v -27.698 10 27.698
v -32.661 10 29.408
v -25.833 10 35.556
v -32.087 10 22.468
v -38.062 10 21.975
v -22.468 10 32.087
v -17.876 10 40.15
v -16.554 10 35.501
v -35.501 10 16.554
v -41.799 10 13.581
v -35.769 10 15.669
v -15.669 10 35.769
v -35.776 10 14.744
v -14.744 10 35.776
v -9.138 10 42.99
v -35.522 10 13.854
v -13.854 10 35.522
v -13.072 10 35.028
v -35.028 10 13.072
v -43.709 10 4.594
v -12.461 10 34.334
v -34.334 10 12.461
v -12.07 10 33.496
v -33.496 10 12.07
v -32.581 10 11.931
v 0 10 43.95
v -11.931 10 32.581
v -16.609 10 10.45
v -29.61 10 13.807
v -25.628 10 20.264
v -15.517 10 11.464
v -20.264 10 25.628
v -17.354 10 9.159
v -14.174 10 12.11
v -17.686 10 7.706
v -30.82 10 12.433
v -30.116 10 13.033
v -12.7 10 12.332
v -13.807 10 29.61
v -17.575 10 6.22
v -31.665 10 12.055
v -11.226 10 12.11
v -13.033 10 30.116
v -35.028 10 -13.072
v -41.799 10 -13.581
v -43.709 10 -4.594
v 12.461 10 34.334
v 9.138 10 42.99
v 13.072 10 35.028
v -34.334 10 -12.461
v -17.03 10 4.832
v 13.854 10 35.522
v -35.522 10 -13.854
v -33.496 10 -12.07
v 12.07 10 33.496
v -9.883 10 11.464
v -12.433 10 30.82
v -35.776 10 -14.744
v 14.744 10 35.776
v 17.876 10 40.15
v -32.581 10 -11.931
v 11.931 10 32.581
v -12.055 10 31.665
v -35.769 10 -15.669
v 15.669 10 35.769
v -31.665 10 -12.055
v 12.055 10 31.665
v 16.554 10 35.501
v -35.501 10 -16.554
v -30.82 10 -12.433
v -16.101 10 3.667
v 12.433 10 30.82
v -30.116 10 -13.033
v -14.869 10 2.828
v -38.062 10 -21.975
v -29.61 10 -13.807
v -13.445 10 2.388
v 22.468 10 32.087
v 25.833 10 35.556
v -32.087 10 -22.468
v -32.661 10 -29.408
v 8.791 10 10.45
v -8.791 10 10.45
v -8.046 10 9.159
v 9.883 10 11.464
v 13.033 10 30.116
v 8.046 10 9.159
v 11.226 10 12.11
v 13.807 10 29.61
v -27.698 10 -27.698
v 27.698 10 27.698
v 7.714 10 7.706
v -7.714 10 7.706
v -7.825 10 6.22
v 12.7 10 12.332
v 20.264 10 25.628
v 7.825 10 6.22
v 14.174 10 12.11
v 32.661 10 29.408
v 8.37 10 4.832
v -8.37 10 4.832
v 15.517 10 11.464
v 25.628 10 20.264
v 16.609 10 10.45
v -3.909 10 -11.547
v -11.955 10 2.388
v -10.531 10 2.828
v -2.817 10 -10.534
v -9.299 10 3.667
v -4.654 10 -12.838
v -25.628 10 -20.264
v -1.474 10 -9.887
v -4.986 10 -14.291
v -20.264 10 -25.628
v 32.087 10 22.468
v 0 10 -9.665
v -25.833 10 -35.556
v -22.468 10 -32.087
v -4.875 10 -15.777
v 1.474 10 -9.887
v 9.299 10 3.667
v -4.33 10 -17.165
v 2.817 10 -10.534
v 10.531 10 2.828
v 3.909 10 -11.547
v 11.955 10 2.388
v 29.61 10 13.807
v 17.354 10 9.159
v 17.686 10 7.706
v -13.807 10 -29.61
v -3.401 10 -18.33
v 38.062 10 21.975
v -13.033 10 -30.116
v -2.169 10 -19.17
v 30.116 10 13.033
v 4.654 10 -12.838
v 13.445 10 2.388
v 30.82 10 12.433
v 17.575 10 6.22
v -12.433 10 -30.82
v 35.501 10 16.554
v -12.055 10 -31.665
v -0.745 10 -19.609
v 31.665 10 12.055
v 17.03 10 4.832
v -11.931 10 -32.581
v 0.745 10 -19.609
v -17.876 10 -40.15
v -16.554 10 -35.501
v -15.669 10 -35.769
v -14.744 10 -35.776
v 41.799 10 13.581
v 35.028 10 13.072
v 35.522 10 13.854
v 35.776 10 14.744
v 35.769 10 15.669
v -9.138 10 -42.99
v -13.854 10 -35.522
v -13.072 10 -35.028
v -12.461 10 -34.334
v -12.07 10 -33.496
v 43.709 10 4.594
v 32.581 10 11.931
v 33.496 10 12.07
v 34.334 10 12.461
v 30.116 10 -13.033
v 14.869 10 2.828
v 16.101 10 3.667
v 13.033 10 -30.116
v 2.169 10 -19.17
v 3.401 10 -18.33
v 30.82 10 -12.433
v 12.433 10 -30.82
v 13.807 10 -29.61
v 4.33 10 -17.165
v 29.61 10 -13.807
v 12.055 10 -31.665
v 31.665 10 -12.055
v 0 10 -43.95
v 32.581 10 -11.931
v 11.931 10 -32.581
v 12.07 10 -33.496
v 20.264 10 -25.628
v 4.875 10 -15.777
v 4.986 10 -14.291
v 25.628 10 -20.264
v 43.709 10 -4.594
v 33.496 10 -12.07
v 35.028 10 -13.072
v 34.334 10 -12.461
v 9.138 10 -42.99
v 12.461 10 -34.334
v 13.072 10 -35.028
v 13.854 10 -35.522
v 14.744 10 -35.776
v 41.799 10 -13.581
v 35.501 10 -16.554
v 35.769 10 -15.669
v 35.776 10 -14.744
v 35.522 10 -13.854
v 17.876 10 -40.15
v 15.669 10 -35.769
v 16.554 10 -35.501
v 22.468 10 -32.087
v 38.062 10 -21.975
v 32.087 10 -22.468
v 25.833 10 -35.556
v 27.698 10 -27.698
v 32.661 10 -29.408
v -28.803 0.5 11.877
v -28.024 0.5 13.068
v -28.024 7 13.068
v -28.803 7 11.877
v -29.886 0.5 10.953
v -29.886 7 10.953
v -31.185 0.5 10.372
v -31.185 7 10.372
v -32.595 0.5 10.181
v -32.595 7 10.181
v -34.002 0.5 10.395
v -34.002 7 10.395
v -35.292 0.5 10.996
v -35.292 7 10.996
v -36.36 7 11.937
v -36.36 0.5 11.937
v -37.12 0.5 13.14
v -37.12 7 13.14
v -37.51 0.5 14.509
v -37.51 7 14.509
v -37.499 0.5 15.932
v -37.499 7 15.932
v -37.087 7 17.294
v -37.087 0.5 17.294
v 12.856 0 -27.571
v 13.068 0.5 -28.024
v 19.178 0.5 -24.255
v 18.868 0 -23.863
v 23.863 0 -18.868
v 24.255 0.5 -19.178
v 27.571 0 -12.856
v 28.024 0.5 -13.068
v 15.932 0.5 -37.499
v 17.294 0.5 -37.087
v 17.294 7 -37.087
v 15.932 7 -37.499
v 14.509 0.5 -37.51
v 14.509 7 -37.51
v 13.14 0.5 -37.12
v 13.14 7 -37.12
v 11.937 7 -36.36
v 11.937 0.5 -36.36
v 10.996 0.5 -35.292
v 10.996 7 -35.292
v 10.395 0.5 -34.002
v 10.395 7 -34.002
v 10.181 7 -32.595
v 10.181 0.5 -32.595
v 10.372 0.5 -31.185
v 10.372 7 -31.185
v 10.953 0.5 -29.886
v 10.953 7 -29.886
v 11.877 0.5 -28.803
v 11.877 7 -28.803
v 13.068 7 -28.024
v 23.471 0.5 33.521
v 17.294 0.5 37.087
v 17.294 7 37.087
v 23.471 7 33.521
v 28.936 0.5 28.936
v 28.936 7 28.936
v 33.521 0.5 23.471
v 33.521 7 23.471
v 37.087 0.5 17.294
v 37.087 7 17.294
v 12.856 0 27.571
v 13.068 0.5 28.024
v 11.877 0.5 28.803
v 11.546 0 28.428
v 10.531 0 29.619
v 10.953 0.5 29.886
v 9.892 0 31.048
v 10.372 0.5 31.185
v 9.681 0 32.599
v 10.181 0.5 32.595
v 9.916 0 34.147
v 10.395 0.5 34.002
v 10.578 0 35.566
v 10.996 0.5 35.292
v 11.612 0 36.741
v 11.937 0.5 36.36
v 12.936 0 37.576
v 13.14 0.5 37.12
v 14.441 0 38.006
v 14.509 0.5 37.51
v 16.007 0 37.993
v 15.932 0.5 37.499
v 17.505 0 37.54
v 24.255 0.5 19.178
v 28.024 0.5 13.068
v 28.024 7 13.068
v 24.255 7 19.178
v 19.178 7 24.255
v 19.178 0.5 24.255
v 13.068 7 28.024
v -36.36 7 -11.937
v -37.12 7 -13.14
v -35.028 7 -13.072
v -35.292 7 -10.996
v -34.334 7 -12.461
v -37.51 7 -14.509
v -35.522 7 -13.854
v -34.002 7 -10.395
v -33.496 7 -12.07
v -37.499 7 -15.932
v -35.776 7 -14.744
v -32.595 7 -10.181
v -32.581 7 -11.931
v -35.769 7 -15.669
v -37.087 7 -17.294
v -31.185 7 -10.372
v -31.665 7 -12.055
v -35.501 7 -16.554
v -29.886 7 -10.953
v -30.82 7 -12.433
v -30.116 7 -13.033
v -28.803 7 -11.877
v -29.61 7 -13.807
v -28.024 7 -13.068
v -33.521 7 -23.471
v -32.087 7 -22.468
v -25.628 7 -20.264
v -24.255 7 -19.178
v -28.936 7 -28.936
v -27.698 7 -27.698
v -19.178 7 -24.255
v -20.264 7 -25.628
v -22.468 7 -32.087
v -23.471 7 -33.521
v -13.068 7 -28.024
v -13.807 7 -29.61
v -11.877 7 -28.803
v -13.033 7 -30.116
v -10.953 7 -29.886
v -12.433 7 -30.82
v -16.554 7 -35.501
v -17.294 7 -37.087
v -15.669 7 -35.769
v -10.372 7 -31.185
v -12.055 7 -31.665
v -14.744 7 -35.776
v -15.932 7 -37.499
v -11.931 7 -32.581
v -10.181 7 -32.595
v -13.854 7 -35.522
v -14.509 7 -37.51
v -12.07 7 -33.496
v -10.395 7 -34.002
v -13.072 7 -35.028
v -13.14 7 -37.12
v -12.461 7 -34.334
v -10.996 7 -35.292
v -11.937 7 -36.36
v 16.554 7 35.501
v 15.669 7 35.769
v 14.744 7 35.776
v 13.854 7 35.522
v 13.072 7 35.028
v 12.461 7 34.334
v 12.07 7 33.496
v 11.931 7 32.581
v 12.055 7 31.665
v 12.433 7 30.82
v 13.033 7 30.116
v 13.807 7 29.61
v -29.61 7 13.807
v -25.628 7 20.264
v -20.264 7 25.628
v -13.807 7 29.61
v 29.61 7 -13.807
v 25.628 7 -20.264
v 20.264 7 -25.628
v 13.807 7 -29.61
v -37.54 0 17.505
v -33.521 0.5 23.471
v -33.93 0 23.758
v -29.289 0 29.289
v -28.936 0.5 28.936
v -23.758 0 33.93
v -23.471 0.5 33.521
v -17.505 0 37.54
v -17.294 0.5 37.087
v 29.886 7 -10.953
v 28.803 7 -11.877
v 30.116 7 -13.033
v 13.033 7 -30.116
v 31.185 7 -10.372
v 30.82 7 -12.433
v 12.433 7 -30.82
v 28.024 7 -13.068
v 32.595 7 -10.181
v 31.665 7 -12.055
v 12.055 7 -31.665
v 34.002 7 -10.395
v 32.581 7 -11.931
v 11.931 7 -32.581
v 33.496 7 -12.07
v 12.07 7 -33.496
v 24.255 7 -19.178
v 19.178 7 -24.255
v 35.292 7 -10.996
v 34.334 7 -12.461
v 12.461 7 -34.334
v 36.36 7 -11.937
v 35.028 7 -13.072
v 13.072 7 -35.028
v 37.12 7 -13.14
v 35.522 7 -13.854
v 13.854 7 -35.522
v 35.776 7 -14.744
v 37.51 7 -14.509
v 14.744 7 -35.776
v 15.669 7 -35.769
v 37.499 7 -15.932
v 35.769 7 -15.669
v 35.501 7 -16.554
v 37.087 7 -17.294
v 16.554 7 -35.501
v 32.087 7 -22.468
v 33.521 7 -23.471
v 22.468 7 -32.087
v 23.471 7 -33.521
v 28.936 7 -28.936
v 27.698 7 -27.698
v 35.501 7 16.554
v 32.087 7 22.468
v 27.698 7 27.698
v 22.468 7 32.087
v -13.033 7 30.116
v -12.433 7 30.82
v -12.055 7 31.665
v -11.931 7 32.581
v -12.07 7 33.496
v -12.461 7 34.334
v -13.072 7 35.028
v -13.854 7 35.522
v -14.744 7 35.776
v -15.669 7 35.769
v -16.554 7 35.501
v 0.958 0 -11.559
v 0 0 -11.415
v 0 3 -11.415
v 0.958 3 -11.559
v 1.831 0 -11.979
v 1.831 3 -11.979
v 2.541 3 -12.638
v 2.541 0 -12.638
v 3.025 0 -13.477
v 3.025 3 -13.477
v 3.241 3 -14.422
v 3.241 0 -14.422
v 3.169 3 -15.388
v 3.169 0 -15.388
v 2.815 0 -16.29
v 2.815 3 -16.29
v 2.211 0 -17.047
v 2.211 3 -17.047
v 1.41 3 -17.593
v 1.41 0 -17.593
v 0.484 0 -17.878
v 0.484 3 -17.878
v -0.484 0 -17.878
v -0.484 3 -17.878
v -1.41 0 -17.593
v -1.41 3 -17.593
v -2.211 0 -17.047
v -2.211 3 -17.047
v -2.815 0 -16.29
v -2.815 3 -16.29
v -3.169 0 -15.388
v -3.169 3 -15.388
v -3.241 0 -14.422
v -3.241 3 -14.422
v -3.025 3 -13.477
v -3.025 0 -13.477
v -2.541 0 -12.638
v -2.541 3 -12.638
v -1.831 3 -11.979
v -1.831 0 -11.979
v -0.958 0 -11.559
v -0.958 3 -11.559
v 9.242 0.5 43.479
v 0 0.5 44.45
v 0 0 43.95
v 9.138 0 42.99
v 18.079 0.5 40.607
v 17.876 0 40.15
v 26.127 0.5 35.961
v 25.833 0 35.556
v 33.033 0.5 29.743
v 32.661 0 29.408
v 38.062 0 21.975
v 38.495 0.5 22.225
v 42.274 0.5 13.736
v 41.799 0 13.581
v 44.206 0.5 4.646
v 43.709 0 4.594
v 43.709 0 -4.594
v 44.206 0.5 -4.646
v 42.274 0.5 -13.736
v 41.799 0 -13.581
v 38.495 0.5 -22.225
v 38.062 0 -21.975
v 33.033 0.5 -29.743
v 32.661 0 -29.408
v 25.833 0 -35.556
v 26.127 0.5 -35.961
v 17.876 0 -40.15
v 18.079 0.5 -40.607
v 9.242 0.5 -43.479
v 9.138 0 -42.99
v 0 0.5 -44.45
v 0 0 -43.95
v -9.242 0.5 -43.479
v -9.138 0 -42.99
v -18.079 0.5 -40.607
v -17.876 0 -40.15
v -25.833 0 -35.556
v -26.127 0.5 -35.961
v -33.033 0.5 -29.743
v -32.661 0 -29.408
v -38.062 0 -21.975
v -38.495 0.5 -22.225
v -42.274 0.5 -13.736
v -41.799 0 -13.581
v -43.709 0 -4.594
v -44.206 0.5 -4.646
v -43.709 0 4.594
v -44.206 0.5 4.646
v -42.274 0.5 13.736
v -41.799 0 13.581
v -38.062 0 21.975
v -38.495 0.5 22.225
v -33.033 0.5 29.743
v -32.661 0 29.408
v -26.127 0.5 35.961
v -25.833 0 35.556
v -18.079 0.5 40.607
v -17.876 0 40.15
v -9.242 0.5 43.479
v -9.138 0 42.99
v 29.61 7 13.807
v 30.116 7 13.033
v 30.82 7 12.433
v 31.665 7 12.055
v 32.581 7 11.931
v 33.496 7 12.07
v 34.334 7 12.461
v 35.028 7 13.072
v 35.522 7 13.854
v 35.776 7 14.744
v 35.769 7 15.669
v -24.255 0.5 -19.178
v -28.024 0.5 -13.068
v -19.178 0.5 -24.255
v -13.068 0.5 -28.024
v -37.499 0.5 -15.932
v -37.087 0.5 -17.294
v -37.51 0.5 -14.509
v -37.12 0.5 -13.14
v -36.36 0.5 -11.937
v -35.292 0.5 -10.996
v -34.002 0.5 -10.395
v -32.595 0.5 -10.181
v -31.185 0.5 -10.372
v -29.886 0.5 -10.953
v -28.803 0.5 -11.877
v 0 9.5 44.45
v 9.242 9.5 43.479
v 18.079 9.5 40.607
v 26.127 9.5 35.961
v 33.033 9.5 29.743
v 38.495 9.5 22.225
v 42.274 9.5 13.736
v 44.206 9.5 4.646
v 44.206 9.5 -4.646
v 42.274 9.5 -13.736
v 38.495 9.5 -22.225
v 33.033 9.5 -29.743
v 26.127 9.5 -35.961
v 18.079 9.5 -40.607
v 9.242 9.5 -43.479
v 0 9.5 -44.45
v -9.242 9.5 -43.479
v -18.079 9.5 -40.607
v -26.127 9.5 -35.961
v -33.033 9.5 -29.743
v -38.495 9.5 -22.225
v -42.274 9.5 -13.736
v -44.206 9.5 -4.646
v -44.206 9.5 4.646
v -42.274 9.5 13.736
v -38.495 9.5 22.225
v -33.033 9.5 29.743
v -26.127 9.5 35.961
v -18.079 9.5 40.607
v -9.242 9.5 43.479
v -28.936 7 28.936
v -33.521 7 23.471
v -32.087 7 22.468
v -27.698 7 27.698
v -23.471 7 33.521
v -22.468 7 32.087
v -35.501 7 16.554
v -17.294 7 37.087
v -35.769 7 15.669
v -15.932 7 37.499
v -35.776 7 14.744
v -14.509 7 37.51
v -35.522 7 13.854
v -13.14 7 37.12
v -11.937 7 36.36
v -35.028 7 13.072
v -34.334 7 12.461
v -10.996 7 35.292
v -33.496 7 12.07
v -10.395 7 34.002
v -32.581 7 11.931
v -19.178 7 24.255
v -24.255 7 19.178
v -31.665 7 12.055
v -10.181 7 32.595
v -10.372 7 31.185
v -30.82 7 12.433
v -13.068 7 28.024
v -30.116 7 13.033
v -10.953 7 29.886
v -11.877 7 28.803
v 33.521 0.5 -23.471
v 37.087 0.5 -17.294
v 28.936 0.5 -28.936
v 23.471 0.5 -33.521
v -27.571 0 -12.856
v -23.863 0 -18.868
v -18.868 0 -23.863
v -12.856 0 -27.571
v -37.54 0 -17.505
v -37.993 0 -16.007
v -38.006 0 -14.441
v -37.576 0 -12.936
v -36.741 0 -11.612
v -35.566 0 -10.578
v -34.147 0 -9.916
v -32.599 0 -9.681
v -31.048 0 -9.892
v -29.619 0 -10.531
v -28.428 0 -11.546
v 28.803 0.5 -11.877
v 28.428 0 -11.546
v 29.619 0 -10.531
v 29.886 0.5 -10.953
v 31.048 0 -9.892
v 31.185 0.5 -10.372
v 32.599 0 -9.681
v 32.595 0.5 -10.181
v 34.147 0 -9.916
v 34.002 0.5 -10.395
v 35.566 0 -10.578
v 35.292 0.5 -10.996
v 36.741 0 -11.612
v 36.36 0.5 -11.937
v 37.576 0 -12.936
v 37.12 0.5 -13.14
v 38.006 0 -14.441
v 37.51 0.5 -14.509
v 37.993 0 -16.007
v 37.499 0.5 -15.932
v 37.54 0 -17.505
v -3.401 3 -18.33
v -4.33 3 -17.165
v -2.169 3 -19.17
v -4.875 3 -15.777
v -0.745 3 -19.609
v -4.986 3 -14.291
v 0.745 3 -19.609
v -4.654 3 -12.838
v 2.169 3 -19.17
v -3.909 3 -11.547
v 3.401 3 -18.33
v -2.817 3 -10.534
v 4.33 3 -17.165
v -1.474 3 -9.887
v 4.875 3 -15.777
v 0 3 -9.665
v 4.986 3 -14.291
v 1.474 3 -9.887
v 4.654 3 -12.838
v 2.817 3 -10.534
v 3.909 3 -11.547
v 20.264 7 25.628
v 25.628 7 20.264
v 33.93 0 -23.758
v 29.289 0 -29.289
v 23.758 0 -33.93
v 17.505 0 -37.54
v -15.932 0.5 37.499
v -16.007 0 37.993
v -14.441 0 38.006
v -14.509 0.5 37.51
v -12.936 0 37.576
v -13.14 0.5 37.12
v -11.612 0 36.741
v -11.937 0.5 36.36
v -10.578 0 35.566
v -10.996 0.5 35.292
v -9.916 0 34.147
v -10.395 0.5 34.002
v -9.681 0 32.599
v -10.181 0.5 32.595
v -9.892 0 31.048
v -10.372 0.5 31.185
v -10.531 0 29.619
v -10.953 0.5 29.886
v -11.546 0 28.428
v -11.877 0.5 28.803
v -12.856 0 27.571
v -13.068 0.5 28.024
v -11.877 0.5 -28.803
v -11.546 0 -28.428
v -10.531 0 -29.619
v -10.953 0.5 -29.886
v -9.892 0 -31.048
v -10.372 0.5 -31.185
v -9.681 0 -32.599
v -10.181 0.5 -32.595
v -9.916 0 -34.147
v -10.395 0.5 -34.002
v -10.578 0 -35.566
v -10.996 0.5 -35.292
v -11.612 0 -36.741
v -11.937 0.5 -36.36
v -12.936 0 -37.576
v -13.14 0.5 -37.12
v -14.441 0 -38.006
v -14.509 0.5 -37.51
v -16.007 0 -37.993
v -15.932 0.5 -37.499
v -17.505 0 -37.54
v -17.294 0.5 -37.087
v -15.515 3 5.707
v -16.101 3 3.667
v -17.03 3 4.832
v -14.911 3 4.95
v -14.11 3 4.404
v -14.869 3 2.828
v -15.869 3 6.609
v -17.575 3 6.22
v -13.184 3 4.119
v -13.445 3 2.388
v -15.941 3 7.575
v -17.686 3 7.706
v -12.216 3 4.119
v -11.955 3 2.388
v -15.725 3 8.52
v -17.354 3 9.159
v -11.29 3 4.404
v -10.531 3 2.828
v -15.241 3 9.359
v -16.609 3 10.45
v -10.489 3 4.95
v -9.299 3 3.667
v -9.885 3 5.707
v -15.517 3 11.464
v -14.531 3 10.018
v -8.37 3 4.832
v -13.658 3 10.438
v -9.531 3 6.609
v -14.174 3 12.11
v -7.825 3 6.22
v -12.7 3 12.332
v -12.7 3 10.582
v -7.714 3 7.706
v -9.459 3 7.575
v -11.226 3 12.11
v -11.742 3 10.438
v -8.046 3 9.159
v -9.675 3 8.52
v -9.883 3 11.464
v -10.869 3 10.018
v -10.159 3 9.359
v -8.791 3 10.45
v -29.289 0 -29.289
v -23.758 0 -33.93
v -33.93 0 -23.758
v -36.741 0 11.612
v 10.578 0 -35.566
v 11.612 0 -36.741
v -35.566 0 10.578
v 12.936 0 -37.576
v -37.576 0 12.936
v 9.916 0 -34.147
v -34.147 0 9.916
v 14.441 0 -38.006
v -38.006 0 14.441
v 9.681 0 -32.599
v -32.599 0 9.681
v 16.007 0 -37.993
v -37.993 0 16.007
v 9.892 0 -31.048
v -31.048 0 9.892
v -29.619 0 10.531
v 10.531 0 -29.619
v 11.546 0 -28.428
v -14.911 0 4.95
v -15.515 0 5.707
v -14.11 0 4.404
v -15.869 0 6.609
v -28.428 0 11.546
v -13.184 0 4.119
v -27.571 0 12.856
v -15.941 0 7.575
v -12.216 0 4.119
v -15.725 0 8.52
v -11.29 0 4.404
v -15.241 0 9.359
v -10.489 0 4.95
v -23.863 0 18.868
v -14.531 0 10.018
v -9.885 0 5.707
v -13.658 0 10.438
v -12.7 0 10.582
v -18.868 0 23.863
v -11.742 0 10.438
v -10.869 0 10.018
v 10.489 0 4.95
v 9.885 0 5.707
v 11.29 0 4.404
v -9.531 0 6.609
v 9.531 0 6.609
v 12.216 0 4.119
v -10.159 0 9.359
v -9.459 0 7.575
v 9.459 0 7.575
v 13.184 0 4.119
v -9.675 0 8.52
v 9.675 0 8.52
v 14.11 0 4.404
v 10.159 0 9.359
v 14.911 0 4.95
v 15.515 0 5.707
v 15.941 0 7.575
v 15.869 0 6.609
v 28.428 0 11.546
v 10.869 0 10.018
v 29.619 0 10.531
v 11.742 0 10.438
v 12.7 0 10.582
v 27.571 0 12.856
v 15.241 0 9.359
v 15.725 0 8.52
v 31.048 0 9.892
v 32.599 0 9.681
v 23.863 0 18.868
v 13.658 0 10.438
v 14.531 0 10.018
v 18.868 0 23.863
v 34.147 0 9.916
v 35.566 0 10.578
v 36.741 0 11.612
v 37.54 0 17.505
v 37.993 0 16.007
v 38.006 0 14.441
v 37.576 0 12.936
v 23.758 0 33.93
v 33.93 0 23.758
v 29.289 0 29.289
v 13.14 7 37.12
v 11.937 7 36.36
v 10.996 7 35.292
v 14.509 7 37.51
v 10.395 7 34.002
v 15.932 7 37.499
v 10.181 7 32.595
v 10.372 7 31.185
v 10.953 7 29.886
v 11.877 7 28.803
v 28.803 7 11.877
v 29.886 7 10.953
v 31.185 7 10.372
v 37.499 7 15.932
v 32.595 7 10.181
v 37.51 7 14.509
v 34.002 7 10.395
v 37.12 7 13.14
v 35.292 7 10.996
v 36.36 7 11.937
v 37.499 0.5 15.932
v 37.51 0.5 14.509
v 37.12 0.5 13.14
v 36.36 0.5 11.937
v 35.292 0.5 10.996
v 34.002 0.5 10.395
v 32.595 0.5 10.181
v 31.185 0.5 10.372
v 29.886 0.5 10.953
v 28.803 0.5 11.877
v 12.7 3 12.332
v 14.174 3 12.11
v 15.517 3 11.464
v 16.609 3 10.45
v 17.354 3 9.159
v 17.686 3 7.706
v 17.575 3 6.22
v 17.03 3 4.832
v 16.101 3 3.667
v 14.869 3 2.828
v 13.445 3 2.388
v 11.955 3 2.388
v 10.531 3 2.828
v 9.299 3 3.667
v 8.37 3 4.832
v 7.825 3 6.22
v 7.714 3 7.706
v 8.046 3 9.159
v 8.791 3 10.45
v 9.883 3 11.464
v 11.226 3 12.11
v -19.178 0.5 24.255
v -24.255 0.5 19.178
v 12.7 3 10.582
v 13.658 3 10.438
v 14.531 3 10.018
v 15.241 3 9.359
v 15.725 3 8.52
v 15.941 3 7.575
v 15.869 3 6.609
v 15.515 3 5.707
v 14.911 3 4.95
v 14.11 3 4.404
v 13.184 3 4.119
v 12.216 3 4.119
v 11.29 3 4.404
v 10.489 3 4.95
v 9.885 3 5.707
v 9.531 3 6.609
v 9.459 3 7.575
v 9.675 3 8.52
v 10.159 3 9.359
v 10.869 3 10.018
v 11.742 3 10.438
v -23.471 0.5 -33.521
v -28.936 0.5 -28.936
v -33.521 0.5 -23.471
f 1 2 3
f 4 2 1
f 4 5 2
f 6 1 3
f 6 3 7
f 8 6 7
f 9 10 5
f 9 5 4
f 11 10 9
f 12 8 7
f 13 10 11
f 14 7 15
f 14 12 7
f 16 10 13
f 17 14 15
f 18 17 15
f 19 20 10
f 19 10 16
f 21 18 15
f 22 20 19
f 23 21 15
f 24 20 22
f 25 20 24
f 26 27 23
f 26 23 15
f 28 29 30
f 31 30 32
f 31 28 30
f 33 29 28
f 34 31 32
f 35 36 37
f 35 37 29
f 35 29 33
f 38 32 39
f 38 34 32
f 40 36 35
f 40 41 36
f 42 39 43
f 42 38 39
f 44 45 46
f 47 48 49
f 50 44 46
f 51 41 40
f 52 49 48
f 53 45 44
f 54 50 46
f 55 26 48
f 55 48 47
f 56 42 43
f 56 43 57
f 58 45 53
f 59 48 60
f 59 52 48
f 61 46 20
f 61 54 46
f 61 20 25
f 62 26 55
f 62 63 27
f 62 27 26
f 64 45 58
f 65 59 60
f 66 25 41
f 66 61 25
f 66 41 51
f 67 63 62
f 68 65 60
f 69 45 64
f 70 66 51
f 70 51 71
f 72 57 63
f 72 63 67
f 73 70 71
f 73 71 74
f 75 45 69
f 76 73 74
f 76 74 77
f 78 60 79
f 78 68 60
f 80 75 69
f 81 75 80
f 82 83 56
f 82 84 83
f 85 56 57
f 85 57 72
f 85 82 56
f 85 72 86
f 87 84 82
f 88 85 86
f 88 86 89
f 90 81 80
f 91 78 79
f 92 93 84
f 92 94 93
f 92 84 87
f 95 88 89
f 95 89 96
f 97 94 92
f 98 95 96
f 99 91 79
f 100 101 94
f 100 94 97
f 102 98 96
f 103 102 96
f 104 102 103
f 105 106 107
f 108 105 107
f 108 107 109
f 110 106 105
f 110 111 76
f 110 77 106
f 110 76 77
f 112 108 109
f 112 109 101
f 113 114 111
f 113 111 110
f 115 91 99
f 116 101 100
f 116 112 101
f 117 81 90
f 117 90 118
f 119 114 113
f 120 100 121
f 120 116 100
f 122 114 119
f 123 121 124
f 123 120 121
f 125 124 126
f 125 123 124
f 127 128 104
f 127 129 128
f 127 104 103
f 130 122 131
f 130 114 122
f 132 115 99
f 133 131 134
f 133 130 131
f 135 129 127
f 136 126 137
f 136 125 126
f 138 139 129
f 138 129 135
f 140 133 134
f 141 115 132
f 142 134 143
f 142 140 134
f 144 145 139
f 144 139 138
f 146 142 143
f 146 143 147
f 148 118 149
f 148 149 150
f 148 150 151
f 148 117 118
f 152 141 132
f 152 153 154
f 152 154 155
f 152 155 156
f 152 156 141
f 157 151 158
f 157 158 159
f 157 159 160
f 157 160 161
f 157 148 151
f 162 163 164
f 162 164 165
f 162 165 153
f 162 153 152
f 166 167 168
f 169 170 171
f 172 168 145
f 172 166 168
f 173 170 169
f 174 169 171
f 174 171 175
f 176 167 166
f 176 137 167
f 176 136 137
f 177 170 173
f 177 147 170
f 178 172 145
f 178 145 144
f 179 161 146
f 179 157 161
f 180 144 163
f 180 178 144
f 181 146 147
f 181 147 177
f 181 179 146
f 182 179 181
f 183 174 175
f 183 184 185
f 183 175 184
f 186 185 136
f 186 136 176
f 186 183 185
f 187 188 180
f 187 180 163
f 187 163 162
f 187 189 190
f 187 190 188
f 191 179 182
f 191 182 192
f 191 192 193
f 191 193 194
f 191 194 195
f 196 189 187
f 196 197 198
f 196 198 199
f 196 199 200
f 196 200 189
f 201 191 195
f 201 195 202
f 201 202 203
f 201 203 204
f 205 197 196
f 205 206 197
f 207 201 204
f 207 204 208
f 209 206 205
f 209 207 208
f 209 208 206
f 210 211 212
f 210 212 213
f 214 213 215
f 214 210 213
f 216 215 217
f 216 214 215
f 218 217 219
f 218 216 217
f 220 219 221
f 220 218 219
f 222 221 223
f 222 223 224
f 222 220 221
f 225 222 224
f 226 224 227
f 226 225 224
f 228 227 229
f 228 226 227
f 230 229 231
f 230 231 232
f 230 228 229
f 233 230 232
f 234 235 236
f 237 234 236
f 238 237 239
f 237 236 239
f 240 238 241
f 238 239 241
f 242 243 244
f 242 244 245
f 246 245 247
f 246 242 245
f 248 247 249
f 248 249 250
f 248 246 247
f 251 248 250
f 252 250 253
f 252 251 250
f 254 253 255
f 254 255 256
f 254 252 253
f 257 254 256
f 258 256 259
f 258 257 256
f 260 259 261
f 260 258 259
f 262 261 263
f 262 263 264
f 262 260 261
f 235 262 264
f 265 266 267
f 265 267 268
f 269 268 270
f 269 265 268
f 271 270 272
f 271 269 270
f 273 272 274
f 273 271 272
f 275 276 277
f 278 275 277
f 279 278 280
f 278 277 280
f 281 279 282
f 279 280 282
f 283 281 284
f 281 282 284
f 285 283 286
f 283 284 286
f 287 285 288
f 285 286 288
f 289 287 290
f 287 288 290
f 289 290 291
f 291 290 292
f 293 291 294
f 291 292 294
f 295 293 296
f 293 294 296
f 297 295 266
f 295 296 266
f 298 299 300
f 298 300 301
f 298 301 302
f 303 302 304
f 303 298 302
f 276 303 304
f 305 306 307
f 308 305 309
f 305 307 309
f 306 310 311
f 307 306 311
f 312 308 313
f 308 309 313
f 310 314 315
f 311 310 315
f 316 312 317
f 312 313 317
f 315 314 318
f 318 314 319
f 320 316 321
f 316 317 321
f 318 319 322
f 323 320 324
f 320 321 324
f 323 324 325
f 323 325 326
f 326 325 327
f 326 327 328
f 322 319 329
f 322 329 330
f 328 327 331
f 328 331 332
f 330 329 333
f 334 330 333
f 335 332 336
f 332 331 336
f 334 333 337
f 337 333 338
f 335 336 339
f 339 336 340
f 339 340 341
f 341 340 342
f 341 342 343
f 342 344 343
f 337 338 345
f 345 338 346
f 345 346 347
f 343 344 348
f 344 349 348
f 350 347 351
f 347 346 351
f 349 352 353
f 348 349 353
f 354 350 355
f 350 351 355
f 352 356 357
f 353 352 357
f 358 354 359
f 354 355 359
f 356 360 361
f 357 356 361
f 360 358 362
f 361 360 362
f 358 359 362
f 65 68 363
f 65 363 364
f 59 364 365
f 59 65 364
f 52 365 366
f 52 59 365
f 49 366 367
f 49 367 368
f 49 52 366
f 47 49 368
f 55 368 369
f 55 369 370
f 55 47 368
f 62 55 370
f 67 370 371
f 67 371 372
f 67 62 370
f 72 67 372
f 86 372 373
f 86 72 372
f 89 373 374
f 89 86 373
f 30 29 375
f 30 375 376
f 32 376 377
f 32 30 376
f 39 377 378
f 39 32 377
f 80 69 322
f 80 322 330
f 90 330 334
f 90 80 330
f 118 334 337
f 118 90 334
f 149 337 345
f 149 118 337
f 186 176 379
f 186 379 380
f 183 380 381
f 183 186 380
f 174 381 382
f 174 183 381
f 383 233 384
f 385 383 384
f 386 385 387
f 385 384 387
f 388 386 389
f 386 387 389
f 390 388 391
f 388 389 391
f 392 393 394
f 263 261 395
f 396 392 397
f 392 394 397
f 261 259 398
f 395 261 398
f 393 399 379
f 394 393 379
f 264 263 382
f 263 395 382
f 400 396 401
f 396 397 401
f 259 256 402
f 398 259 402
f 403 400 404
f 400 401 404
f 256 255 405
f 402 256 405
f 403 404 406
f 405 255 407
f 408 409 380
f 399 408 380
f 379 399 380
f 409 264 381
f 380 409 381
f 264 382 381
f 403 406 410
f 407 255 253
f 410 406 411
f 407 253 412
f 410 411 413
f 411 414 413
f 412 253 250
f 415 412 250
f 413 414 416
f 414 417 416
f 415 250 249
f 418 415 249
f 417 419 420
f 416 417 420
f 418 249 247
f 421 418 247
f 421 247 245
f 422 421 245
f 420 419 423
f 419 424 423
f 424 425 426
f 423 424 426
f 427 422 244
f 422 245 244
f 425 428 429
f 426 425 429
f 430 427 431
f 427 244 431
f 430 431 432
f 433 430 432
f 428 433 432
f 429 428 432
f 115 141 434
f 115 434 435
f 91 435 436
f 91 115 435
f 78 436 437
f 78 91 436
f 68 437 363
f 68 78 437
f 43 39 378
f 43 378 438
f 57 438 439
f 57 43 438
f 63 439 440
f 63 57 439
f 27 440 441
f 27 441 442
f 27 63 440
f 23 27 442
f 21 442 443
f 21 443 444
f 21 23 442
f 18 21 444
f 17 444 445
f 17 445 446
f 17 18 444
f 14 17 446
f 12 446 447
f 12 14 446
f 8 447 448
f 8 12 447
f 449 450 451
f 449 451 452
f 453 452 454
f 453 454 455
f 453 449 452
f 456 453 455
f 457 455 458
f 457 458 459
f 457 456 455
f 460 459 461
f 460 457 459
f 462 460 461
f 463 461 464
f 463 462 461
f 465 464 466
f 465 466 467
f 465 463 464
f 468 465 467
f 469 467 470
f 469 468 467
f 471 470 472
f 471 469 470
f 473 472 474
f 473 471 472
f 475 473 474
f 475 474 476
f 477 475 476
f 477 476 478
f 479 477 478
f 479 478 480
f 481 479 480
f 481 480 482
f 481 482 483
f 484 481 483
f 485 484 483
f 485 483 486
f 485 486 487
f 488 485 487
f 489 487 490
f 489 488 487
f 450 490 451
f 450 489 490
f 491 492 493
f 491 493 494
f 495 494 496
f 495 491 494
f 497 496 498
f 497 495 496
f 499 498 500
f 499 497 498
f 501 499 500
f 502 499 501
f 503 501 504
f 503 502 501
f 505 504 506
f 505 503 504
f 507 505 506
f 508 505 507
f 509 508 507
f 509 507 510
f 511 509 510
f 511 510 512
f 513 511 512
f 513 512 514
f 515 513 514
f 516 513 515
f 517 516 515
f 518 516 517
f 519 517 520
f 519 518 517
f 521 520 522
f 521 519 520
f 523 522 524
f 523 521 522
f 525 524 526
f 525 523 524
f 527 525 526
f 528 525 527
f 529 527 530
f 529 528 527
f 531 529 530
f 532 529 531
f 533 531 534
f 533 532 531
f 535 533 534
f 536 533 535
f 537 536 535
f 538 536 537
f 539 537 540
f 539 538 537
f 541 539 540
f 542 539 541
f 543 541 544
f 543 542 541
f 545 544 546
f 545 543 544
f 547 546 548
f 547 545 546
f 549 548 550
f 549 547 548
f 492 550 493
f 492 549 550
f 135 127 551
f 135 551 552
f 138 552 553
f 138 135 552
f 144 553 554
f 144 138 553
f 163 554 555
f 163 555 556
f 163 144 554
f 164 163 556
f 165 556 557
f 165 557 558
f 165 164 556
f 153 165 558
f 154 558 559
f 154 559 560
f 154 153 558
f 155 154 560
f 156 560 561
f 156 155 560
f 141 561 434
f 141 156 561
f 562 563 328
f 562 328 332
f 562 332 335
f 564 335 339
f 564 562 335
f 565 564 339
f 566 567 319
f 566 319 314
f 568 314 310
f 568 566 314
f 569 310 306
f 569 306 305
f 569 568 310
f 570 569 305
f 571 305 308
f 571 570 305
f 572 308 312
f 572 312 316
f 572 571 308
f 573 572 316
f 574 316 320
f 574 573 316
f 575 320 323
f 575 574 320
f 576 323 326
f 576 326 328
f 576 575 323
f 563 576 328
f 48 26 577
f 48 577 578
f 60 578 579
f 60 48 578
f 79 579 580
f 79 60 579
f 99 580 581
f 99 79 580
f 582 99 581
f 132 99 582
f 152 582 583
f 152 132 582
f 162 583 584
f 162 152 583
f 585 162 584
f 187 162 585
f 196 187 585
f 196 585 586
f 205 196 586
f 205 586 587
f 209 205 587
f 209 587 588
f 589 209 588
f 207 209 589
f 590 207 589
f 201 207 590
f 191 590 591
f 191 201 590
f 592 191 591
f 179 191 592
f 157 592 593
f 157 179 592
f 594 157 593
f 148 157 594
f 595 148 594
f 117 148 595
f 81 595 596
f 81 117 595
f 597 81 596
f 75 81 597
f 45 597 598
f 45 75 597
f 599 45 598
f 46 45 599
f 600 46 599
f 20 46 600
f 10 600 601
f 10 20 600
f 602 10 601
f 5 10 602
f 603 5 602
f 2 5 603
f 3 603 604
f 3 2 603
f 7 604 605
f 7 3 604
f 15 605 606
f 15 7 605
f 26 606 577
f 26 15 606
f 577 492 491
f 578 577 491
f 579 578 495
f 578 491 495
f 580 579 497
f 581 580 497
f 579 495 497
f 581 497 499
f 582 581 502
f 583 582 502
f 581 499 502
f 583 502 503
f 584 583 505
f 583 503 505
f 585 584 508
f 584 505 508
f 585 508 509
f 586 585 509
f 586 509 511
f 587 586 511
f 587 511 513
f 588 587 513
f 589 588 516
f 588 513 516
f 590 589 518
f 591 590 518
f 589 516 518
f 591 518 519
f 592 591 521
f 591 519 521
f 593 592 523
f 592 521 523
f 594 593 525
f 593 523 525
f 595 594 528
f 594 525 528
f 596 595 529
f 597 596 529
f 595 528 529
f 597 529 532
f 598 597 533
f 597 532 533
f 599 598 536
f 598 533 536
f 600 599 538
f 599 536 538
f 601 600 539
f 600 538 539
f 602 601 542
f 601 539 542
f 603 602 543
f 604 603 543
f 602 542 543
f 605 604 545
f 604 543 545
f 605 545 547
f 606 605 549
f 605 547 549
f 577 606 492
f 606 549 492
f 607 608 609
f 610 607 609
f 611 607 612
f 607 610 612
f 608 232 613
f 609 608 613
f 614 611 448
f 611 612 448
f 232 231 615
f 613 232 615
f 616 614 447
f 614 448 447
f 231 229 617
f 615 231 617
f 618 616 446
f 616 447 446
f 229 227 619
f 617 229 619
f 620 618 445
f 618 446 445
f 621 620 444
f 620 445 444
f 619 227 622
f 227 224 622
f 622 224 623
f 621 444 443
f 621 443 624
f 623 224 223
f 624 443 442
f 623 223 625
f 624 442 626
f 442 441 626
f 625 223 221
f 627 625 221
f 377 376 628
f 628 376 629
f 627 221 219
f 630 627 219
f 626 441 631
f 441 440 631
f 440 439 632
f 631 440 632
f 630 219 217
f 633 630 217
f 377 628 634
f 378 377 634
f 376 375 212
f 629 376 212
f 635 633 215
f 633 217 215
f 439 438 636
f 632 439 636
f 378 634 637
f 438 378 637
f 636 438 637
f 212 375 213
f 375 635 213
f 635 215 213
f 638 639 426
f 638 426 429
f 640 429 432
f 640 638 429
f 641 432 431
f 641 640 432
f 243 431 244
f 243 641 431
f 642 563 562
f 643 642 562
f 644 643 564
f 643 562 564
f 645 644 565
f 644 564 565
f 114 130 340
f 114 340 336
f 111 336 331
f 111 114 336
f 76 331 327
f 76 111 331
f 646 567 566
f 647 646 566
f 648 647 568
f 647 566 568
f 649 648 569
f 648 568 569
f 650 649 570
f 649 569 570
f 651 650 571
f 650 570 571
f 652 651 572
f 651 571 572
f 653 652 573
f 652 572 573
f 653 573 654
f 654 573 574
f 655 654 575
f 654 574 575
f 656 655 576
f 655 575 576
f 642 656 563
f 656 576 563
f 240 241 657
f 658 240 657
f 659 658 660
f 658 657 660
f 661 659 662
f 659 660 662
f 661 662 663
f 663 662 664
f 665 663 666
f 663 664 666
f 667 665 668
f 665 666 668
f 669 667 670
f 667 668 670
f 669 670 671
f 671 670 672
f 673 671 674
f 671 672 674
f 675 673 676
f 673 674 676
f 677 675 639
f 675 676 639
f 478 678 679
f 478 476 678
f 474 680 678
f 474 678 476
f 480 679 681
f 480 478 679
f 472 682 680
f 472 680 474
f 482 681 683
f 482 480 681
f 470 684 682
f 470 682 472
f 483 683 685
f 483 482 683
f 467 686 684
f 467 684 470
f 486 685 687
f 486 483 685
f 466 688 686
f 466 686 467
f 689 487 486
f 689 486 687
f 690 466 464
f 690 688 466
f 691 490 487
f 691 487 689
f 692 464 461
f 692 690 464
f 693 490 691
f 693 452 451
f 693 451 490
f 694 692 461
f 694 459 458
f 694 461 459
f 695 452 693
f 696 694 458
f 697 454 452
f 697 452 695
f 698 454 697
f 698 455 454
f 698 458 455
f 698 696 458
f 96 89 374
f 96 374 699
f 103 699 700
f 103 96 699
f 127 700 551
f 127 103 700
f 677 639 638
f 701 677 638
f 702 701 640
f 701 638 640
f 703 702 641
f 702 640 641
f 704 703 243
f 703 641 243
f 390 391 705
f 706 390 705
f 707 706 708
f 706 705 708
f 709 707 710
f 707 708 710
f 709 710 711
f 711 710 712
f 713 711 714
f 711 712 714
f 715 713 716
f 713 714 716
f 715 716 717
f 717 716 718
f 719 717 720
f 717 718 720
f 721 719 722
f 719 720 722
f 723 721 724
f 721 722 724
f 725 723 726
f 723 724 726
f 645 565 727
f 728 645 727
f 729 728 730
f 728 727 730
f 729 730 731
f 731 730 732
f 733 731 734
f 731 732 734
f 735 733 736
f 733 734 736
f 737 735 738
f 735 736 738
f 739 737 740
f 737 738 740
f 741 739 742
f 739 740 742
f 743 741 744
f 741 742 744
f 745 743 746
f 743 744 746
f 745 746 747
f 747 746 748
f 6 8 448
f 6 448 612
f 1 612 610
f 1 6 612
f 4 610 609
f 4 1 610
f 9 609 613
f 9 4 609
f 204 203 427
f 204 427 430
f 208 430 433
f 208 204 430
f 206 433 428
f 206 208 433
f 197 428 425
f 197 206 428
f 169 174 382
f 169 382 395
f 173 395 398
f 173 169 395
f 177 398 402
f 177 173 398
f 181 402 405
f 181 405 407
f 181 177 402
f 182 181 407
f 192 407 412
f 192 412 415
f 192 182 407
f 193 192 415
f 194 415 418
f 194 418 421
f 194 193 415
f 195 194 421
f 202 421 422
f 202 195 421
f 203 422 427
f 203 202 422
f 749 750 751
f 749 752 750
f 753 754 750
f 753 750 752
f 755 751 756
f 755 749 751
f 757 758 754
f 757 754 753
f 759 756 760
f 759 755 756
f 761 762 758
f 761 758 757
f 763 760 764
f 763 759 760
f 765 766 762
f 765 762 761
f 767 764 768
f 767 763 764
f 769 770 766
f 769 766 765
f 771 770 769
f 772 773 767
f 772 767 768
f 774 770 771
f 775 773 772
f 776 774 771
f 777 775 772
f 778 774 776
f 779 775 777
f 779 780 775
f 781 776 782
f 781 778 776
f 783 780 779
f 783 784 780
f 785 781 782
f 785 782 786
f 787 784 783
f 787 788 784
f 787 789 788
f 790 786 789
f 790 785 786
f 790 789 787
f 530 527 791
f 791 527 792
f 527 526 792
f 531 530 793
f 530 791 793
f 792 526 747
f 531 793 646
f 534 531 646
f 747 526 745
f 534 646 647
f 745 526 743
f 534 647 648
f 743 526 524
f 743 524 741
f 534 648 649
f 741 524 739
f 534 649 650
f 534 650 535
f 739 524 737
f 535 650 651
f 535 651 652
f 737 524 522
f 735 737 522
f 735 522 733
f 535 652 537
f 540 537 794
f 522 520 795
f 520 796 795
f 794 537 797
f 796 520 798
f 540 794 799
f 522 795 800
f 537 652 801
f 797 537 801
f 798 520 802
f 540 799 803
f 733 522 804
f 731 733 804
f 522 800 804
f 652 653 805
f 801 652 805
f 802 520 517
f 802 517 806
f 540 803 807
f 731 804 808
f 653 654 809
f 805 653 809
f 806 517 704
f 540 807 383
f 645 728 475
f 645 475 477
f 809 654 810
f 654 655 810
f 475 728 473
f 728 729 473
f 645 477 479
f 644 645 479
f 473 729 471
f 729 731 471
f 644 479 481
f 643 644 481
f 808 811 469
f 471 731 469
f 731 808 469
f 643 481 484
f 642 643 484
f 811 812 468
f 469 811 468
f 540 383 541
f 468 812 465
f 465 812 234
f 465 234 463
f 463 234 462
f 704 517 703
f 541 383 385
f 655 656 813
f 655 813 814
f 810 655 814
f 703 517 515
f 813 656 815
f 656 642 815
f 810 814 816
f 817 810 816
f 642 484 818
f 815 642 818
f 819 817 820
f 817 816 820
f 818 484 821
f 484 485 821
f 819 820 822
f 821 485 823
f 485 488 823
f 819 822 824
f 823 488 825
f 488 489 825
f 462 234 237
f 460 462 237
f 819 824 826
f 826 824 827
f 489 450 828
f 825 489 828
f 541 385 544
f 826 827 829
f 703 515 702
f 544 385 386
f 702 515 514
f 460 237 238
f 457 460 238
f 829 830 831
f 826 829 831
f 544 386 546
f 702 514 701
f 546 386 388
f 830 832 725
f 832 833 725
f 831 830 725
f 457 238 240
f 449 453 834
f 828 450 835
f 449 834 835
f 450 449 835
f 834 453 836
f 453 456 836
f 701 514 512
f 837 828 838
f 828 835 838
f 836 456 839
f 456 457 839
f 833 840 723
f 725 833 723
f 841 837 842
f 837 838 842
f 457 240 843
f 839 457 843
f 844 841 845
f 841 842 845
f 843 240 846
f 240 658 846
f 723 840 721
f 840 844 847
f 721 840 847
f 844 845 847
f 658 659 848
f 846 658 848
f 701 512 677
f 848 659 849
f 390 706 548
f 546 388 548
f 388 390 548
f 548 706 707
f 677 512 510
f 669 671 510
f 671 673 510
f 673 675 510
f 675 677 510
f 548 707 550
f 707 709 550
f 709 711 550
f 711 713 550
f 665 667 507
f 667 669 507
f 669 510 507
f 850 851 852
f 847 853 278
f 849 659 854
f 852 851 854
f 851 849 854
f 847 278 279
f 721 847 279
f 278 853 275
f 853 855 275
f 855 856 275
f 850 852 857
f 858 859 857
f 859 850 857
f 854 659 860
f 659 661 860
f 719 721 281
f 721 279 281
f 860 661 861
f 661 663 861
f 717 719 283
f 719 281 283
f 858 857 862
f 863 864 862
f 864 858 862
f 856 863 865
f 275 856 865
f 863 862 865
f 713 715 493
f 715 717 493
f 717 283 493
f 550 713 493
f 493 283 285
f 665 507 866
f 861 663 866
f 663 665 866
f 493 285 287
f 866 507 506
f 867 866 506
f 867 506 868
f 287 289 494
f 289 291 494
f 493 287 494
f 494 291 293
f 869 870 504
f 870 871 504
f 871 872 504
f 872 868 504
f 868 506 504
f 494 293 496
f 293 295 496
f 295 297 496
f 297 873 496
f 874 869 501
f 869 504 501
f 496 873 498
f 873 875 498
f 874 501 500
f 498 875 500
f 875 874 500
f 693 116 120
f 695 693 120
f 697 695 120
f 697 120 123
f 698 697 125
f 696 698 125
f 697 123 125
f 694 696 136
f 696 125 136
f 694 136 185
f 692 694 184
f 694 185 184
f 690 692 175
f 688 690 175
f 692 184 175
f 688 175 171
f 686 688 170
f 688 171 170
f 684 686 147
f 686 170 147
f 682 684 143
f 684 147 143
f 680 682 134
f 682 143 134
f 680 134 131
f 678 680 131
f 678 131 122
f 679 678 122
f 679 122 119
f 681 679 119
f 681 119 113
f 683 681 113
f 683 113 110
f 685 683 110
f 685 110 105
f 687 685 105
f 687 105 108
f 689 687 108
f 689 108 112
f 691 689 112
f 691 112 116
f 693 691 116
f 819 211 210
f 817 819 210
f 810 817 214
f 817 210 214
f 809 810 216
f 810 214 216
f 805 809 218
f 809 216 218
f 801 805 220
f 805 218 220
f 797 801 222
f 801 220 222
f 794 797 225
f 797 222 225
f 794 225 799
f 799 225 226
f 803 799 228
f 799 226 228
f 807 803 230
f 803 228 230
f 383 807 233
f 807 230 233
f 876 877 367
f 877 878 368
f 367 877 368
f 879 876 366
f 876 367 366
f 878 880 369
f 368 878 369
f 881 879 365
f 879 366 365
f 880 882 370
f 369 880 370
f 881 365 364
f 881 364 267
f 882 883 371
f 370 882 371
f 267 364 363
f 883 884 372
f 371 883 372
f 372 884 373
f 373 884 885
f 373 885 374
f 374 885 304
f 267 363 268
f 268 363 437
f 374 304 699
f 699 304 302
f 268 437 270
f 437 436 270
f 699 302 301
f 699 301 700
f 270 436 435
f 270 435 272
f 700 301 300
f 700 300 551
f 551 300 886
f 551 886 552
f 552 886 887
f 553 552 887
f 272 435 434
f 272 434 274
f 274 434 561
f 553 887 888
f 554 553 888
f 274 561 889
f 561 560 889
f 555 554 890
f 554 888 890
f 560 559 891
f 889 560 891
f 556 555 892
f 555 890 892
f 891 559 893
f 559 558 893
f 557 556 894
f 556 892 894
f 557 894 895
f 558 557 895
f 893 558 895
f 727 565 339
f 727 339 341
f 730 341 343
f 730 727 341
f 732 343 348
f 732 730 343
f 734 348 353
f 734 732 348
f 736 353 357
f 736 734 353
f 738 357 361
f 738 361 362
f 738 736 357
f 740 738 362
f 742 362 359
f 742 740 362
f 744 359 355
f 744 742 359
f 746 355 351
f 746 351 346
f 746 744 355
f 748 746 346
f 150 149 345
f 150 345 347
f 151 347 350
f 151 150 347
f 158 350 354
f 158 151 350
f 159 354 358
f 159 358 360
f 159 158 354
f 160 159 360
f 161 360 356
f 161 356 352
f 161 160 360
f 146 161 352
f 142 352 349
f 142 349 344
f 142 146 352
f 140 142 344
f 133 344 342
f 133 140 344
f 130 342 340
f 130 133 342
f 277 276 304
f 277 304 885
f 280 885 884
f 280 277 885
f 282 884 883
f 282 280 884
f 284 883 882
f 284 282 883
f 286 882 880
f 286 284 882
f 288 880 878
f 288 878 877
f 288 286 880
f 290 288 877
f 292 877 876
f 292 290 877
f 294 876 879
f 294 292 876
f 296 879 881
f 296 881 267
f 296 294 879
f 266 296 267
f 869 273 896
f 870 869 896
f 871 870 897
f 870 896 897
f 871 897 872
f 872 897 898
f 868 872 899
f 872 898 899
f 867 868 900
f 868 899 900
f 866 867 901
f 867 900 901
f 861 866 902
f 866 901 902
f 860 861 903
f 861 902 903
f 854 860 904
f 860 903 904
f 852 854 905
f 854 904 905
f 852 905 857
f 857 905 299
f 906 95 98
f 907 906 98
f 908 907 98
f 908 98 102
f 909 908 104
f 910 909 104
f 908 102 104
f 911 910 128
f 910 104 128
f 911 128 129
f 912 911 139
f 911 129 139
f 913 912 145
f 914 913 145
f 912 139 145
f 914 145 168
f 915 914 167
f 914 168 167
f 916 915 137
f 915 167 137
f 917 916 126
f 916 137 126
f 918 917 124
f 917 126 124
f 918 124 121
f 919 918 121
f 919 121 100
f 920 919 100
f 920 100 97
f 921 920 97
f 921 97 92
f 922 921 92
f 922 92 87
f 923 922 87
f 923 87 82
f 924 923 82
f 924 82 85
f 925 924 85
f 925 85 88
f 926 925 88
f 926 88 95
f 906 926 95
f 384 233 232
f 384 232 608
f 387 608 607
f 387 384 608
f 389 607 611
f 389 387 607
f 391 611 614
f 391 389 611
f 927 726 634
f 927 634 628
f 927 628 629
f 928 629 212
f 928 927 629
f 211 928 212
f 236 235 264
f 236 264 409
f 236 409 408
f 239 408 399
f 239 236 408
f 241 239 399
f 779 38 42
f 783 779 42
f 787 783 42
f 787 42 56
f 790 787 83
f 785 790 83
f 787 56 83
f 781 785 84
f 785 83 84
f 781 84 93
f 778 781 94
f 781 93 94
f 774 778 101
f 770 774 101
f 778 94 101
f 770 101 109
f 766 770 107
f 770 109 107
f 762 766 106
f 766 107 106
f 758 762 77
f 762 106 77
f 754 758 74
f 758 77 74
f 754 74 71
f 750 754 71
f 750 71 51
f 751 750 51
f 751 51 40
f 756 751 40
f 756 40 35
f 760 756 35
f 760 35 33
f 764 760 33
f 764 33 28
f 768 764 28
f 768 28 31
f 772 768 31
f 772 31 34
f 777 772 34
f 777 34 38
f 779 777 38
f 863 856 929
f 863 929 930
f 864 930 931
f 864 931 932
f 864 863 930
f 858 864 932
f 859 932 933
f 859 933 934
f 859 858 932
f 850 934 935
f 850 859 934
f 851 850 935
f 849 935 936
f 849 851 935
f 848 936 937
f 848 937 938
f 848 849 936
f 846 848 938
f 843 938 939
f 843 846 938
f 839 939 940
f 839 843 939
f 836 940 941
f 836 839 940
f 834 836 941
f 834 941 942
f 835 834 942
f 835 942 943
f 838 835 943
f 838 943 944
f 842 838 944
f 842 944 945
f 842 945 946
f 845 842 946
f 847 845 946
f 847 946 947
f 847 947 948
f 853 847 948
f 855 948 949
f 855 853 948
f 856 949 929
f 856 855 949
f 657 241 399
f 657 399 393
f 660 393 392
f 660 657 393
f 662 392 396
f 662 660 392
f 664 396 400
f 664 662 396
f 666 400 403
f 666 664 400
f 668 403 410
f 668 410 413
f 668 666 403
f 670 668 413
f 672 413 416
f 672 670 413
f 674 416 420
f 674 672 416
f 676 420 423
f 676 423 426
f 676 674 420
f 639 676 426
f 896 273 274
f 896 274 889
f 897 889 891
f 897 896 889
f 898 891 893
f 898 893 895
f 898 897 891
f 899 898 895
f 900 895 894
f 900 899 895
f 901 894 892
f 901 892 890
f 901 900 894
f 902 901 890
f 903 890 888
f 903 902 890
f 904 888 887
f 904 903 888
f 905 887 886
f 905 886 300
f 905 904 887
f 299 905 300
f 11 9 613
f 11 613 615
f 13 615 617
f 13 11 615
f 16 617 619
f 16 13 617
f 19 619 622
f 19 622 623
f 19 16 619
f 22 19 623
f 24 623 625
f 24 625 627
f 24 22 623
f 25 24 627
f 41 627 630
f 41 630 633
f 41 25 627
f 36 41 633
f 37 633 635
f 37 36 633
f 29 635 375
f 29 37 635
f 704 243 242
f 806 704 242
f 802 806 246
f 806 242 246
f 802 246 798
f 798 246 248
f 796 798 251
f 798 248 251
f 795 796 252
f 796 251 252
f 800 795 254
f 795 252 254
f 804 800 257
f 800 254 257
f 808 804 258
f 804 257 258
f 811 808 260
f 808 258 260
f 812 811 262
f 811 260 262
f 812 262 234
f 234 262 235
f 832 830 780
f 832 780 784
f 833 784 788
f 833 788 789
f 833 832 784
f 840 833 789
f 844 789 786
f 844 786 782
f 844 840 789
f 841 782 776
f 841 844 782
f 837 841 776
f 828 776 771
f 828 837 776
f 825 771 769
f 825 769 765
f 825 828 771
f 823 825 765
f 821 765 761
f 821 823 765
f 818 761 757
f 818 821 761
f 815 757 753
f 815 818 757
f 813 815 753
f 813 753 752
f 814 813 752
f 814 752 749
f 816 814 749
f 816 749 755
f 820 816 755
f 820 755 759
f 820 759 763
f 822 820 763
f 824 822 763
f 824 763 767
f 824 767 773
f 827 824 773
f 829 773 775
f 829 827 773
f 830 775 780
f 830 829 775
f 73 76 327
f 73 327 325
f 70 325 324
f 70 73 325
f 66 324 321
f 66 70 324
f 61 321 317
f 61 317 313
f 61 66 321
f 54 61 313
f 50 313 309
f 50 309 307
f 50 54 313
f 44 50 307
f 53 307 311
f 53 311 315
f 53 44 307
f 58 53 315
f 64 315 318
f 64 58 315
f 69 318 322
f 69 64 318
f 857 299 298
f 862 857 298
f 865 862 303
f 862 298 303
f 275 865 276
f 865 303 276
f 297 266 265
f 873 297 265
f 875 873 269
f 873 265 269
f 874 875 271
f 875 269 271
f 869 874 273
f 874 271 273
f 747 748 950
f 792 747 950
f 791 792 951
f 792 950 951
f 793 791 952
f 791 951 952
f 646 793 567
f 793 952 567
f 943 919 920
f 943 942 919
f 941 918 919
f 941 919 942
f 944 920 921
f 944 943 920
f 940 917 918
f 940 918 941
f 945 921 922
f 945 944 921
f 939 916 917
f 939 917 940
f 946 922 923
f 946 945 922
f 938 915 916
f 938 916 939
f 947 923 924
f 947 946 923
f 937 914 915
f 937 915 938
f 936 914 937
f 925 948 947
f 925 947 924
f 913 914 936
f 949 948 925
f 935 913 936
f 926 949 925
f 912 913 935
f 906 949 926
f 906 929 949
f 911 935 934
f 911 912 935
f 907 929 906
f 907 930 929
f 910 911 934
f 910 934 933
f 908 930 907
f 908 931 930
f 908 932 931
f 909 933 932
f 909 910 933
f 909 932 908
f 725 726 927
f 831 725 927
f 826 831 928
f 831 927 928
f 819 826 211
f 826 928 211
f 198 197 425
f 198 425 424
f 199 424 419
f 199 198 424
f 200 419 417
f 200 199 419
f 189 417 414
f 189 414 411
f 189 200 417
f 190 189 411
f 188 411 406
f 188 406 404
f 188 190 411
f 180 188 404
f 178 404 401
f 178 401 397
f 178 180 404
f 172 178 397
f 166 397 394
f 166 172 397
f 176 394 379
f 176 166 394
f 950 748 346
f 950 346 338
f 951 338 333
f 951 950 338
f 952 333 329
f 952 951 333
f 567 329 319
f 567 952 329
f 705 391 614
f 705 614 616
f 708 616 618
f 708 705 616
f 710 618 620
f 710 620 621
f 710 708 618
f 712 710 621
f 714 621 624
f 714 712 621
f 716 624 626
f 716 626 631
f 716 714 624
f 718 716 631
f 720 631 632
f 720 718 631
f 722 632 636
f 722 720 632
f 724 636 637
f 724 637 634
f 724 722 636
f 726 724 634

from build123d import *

# Parameters (mm, degrees)
SKETCH1_R           = 44.45
BOSS_EXTRUDE1_DEPTH = 10
BOSS_EXTRUDE2_DEPTH = 3
SKETCH3_R           = 5
CUT_EXTRUDE1_DEPTH  = 10
SKETCH4_R           = 5
SKETCH4_R_2         = 3.25
BOSS_EXTRUDE4_DEPTH = 3
CHAMFER1_SIZE       = 0.5


with BuildPart() as part:
    # Sketch1 → Boss-Extrude1 (new body)
    with BuildSketch(Plane(origin=(0, 0, 0), x_dir=(1, 0, 0), z_dir=(0, 1, 0))):
        with Locations(Location((0, 0, 0), (0, 0, 270))):
            Circle(SKETCH1_R)
        with BuildLine():
            ThreePointArc((37.087043144, 17.293972236), (28.935533906, 28.935533906), (17.293972236, 37.087043144))
            ThreePointArc((17.293972236, 37.087043144), (10.649341992, 34.668595517), (13.067789619, 28.023965273))
            ThreePointArc((13.067789619, 28.023965273), (21.864466094, 21.864466094), (28.023965273, 13.067789619))
            ThreePointArc((28.023965273, 13.067789619), (34.668595517, 10.649341992), (37.087043144, 17.293972236))
        make_face(mode=Mode.SUBTRACT)
        with BuildLine():
            ThreePointArc((17.293972236, -37.087043144), (28.935533906, -28.935533906), (37.087043144, -17.293972236))
            ThreePointArc((37.087043144, -17.293972236), (34.668595517, -10.649341992), (28.023965273, -13.067789619))
            ThreePointArc((28.023965273, -13.067789619), (21.864466094, -21.864466094), (13.067789619, -28.023965273))
            ThreePointArc((13.067789619, -28.023965273), (10.649341992, -34.668595517), (17.293972236, -37.087043144))
        make_face(mode=Mode.SUBTRACT)
        with BuildLine():
            ThreePointArc((-37.087043144, -17.293972236), (-28.935533906, -28.935533906), (-17.293972236, -37.087043144))
            ThreePointArc((-17.293972236, -37.087043144), (-10.649341992, -34.668595517), (-13.067789619, -28.023965273))
            ThreePointArc((-13.067789619, -28.023965273), (-21.864466094, -21.864466094), (-28.023965273, -13.067789619))
            ThreePointArc((-28.023965273, -13.067789619), (-34.668595517, -10.649341992), (-37.087043144, -17.293972236))
        make_face(mode=Mode.SUBTRACT)
        with BuildLine():
            ThreePointArc((-17.293972236, 37.087043144), (-28.935533906, 28.935533906), (-37.087043144, 17.293972236))
            ThreePointArc((-37.087043144, 17.293972236), (-34.668595517, 10.649341992), (-28.023965273, 13.067789619))
            ThreePointArc((-28.023965273, 13.067789619), (-21.864466094, 21.864466094), (-13.067789619, 28.023965273))
            ThreePointArc((-13.067789619, 28.023965273), (-10.649341992, 34.668595517), (-17.293972236, 37.087043144))
        make_face(mode=Mode.SUBTRACT)
    extrude(amount=BOSS_EXTRUDE1_DEPTH)

    # Sketch2 → Boss-Extrude2 (add)
    with BuildSketch(Plane(origin=(0, 10, 0), x_dir=(1, 0, 0), z_dir=(0, 1, 0))):
        with BuildLine():
            ThreePointArc((-17.293972236, 37.087043144), (-28.935533906, 28.935533906), (-37.087043144, 17.293972236))
            ThreePointArc((-37.087043144, 17.293972236), (-34.668595517, 10.649341992), (-28.023965273, 13.067789619))
            ThreePointArc((-28.023965273, 13.067789619), (-21.864466094, 21.864466094), (-13.067789619, 28.023965273))
            ThreePointArc((-13.067789619, 28.023965273), (-10.649341992, 34.668595517), (-17.293972236, 37.087043144))
        make_face()
        with BuildLine():
            ThreePointArc((-16.554390278, 35.501004516), (-12.23538062, 33.929013559), (-13.807371577, 29.610003901))
            ThreePointArc((-13.807371577, 29.610003901), (-23.101902961, 23.101902961), (-29.610003901, 13.807371577))
            ThreePointArc((-29.610003901, 13.807371577), (-33.929013559, 12.23538062), (-35.501004516, 16.554390278))
            ThreePointArc((-35.501004516, 16.554390278), (-27.698097039, 27.698097039), (-16.554390278, 35.501004516))
        make_face(mode=Mode.SUBTRACT)
        with BuildLine():
            ThreePointArc((17.293972236, 37.087043144), (10.649341992, 34.668595517), (13.067789619, 28.023965273))
            ThreePointArc((13.067789619, 28.023965273), (21.864466094, 21.864466094), (28.023965273, 13.067789619))
            ThreePointArc((28.023965273, 13.067789619), (34.668595517, 10.649341992), (37.087043144, 17.293972236))
            ThreePointArc((37.087043144, 17.293972236), (28.935533906, 28.935533906), (17.293972236, 37.087043144))
        make_face()
        with BuildLine():
            ThreePointArc((35.501004516, 16.554390278), (33.929013559, 12.23538062), (29.610003901, 13.807371577))
            ThreePointArc((29.610003901, 13.807371577), (23.101902961, 23.101902961), (13.807371577, 29.610003901))
            ThreePointArc((13.807371577, 29.610003901), (12.23538062, 33.929013559), (16.554390278, 35.501004516))
            ThreePointArc((16.554390278, 35.501004516), (27.698097039, 27.698097039), (35.501004516, 16.554390278))
        make_face(mode=Mode.SUBTRACT)
        with BuildLine():
            ThreePointArc((37.087043144, -17.293972236), (34.668595517, -10.649341992), (28.023965273, -13.067789619))
            ThreePointArc((28.023965273, -13.067789619), (21.864466094, -21.864466094), (13.067789619, -28.023965273))
            ThreePointArc((13.067789619, -28.023965273), (10.649341992, -34.668595517), (17.293972236, -37.087043144))
            ThreePointArc((17.293972236, -37.087043144), (28.935533906, -28.935533906), (37.087043144, -17.293972236))
        make_face()
        with BuildLine():
            ThreePointArc((16.554390278, -35.501004516), (12.23538062, -33.929013559), (13.807371577, -29.610003901))
            ThreePointArc((13.807371577, -29.610003901), (23.101902961, -23.101902961), (29.610003901, -13.807371577))
            ThreePointArc((29.610003901, -13.807371577), (33.929013559, -12.23538062), (35.501004516, -16.554390278))
            ThreePointArc((35.501004516, -16.554390278), (27.698097039, -27.698097039), (16.554390278, -35.501004516))
        make_face(mode=Mode.SUBTRACT)
        with BuildLine():
            ThreePointArc((-28.023965273, -13.067789619), (-34.668595517, -10.649341992), (-37.087043144, -17.293972236))
            ThreePointArc((-37.087043144, -17.293972236), (-28.935533906, -28.935533906), (-17.293972236, -37.087043144))
            ThreePointArc((-17.293972236, -37.087043144), (-10.649341992, -34.668595517), (-13.067789619, -28.023965273))
            ThreePointArc((-13.067789619, -28.023965273), (-21.864466094, -21.864466094), (-28.023965273, -13.067789619))
        make_face()
        with BuildLine():
            ThreePointArc((-35.501004516, -16.554390278), (-33.929013559, -12.23538062), (-29.610003901, -13.807371577))
            ThreePointArc((-29.610003901, -13.807371577), (-23.101902961, -23.101902961), (-13.807371577, -29.610003901))
            ThreePointArc((-13.807371577, -29.610003901), (-12.23538062, -33.929013559), (-16.554390278, -35.501004516))
            ThreePointArc((-16.554390278, -35.501004516), (-27.698097039, -27.698097039), (-35.501004516, -16.554390278))
        make_face(mode=Mode.SUBTRACT)
    extrude(amount=-BOSS_EXTRUDE2_DEPTH)

    # Sketch3 → Cut-Extrude1 (cut)
    with BuildSketch(Plane(origin=(0, 10, 0), x_dir=(1, 0, 0), z_dir=(0, 1, 0))):
        with Locations(Location((0, 14.664696837, 0), (0, 0, 270))):
            Circle(SKETCH3_R)
        with Locations(Location((-12.7, -7.332348419, 0), (0, 0, 270))):
            Circle(SKETCH3_R)
        with Locations(Location((12.7, -7.332348419, 0), (0, 0, 270))):
            Circle(SKETCH3_R)
    extrude(amount=-CUT_EXTRUDE1_DEPTH, mode=Mode.SUBTRACT)

    # Sketch4 → Boss-Extrude4 (add)
    with BuildSketch(Plane(origin=(0, 0, 0), x_dir=(1, 0, 0), z_dir=(0, 1, 0))):
        with Locations(Location((12.7, -7.332348419, 0), (0, 0, 270))):
            Circle(SKETCH4_R)
        with Locations(Location((12.7, -7.332348419, 0), (0, 0, 270))):
            Circle(SKETCH4_R_2, mode=Mode.SUBTRACT)
        with Locations(Location((-12.7, -7.332348419, 0), (0, 0, 270))):
            Circle(SKETCH4_R)
        with Locations(Location((-12.7, -7.332348419, 0), (0, 0, 270))):
            Circle(SKETCH4_R_2, mode=Mode.SUBTRACT)
        with Locations(Location((0, 14.664696837, 0), (0, 0, 270))):
            Circle(SKETCH4_R)
        with Locations(Location((0, 14.664696837, 0), (0, 0, 270))):
            Circle(SKETCH4_R_2, mode=Mode.SUBTRACT)
    extrude(amount=BOSS_EXTRUDE4_DEPTH)

    # Chamfer1
    chamfer1_edges = [part.edges().sort_by_distance(p)[0] for p in [
        (-34.668595517, 0, 10.649341992),
        (-28.935533906, 0, 28.935533906),
        (-10.649341992, 0, 34.668595517),
        (-21.864466094, 0, 21.864466094),
        (0, 0, -44.45),
        (10.649341992, 0, 34.668595517),
        (28.935533906, 0, 28.935533906),
        (34.668595517, 0, 10.649341992),
        (21.864466094, 0, 21.864466094),
        (-28.935533906, 0, -28.935533906),
        (-34.668595517, 0, -10.649341992),
        (-21.864466094, 0, -21.864466094),
        (-10.649341992, 0, -34.668595517),
        (34.668595517, 0, -10.649341992),
        (28.935533906, 0, -28.935533906),
        (10.649341992, 0, -34.668595517),
        (21.864466094, 0, -21.864466094),
        (0, 10, -44.45),
    ]]
    chamfer(chamfer1_edges, length=CHAMFER1_SIZE)


solid = part.part
